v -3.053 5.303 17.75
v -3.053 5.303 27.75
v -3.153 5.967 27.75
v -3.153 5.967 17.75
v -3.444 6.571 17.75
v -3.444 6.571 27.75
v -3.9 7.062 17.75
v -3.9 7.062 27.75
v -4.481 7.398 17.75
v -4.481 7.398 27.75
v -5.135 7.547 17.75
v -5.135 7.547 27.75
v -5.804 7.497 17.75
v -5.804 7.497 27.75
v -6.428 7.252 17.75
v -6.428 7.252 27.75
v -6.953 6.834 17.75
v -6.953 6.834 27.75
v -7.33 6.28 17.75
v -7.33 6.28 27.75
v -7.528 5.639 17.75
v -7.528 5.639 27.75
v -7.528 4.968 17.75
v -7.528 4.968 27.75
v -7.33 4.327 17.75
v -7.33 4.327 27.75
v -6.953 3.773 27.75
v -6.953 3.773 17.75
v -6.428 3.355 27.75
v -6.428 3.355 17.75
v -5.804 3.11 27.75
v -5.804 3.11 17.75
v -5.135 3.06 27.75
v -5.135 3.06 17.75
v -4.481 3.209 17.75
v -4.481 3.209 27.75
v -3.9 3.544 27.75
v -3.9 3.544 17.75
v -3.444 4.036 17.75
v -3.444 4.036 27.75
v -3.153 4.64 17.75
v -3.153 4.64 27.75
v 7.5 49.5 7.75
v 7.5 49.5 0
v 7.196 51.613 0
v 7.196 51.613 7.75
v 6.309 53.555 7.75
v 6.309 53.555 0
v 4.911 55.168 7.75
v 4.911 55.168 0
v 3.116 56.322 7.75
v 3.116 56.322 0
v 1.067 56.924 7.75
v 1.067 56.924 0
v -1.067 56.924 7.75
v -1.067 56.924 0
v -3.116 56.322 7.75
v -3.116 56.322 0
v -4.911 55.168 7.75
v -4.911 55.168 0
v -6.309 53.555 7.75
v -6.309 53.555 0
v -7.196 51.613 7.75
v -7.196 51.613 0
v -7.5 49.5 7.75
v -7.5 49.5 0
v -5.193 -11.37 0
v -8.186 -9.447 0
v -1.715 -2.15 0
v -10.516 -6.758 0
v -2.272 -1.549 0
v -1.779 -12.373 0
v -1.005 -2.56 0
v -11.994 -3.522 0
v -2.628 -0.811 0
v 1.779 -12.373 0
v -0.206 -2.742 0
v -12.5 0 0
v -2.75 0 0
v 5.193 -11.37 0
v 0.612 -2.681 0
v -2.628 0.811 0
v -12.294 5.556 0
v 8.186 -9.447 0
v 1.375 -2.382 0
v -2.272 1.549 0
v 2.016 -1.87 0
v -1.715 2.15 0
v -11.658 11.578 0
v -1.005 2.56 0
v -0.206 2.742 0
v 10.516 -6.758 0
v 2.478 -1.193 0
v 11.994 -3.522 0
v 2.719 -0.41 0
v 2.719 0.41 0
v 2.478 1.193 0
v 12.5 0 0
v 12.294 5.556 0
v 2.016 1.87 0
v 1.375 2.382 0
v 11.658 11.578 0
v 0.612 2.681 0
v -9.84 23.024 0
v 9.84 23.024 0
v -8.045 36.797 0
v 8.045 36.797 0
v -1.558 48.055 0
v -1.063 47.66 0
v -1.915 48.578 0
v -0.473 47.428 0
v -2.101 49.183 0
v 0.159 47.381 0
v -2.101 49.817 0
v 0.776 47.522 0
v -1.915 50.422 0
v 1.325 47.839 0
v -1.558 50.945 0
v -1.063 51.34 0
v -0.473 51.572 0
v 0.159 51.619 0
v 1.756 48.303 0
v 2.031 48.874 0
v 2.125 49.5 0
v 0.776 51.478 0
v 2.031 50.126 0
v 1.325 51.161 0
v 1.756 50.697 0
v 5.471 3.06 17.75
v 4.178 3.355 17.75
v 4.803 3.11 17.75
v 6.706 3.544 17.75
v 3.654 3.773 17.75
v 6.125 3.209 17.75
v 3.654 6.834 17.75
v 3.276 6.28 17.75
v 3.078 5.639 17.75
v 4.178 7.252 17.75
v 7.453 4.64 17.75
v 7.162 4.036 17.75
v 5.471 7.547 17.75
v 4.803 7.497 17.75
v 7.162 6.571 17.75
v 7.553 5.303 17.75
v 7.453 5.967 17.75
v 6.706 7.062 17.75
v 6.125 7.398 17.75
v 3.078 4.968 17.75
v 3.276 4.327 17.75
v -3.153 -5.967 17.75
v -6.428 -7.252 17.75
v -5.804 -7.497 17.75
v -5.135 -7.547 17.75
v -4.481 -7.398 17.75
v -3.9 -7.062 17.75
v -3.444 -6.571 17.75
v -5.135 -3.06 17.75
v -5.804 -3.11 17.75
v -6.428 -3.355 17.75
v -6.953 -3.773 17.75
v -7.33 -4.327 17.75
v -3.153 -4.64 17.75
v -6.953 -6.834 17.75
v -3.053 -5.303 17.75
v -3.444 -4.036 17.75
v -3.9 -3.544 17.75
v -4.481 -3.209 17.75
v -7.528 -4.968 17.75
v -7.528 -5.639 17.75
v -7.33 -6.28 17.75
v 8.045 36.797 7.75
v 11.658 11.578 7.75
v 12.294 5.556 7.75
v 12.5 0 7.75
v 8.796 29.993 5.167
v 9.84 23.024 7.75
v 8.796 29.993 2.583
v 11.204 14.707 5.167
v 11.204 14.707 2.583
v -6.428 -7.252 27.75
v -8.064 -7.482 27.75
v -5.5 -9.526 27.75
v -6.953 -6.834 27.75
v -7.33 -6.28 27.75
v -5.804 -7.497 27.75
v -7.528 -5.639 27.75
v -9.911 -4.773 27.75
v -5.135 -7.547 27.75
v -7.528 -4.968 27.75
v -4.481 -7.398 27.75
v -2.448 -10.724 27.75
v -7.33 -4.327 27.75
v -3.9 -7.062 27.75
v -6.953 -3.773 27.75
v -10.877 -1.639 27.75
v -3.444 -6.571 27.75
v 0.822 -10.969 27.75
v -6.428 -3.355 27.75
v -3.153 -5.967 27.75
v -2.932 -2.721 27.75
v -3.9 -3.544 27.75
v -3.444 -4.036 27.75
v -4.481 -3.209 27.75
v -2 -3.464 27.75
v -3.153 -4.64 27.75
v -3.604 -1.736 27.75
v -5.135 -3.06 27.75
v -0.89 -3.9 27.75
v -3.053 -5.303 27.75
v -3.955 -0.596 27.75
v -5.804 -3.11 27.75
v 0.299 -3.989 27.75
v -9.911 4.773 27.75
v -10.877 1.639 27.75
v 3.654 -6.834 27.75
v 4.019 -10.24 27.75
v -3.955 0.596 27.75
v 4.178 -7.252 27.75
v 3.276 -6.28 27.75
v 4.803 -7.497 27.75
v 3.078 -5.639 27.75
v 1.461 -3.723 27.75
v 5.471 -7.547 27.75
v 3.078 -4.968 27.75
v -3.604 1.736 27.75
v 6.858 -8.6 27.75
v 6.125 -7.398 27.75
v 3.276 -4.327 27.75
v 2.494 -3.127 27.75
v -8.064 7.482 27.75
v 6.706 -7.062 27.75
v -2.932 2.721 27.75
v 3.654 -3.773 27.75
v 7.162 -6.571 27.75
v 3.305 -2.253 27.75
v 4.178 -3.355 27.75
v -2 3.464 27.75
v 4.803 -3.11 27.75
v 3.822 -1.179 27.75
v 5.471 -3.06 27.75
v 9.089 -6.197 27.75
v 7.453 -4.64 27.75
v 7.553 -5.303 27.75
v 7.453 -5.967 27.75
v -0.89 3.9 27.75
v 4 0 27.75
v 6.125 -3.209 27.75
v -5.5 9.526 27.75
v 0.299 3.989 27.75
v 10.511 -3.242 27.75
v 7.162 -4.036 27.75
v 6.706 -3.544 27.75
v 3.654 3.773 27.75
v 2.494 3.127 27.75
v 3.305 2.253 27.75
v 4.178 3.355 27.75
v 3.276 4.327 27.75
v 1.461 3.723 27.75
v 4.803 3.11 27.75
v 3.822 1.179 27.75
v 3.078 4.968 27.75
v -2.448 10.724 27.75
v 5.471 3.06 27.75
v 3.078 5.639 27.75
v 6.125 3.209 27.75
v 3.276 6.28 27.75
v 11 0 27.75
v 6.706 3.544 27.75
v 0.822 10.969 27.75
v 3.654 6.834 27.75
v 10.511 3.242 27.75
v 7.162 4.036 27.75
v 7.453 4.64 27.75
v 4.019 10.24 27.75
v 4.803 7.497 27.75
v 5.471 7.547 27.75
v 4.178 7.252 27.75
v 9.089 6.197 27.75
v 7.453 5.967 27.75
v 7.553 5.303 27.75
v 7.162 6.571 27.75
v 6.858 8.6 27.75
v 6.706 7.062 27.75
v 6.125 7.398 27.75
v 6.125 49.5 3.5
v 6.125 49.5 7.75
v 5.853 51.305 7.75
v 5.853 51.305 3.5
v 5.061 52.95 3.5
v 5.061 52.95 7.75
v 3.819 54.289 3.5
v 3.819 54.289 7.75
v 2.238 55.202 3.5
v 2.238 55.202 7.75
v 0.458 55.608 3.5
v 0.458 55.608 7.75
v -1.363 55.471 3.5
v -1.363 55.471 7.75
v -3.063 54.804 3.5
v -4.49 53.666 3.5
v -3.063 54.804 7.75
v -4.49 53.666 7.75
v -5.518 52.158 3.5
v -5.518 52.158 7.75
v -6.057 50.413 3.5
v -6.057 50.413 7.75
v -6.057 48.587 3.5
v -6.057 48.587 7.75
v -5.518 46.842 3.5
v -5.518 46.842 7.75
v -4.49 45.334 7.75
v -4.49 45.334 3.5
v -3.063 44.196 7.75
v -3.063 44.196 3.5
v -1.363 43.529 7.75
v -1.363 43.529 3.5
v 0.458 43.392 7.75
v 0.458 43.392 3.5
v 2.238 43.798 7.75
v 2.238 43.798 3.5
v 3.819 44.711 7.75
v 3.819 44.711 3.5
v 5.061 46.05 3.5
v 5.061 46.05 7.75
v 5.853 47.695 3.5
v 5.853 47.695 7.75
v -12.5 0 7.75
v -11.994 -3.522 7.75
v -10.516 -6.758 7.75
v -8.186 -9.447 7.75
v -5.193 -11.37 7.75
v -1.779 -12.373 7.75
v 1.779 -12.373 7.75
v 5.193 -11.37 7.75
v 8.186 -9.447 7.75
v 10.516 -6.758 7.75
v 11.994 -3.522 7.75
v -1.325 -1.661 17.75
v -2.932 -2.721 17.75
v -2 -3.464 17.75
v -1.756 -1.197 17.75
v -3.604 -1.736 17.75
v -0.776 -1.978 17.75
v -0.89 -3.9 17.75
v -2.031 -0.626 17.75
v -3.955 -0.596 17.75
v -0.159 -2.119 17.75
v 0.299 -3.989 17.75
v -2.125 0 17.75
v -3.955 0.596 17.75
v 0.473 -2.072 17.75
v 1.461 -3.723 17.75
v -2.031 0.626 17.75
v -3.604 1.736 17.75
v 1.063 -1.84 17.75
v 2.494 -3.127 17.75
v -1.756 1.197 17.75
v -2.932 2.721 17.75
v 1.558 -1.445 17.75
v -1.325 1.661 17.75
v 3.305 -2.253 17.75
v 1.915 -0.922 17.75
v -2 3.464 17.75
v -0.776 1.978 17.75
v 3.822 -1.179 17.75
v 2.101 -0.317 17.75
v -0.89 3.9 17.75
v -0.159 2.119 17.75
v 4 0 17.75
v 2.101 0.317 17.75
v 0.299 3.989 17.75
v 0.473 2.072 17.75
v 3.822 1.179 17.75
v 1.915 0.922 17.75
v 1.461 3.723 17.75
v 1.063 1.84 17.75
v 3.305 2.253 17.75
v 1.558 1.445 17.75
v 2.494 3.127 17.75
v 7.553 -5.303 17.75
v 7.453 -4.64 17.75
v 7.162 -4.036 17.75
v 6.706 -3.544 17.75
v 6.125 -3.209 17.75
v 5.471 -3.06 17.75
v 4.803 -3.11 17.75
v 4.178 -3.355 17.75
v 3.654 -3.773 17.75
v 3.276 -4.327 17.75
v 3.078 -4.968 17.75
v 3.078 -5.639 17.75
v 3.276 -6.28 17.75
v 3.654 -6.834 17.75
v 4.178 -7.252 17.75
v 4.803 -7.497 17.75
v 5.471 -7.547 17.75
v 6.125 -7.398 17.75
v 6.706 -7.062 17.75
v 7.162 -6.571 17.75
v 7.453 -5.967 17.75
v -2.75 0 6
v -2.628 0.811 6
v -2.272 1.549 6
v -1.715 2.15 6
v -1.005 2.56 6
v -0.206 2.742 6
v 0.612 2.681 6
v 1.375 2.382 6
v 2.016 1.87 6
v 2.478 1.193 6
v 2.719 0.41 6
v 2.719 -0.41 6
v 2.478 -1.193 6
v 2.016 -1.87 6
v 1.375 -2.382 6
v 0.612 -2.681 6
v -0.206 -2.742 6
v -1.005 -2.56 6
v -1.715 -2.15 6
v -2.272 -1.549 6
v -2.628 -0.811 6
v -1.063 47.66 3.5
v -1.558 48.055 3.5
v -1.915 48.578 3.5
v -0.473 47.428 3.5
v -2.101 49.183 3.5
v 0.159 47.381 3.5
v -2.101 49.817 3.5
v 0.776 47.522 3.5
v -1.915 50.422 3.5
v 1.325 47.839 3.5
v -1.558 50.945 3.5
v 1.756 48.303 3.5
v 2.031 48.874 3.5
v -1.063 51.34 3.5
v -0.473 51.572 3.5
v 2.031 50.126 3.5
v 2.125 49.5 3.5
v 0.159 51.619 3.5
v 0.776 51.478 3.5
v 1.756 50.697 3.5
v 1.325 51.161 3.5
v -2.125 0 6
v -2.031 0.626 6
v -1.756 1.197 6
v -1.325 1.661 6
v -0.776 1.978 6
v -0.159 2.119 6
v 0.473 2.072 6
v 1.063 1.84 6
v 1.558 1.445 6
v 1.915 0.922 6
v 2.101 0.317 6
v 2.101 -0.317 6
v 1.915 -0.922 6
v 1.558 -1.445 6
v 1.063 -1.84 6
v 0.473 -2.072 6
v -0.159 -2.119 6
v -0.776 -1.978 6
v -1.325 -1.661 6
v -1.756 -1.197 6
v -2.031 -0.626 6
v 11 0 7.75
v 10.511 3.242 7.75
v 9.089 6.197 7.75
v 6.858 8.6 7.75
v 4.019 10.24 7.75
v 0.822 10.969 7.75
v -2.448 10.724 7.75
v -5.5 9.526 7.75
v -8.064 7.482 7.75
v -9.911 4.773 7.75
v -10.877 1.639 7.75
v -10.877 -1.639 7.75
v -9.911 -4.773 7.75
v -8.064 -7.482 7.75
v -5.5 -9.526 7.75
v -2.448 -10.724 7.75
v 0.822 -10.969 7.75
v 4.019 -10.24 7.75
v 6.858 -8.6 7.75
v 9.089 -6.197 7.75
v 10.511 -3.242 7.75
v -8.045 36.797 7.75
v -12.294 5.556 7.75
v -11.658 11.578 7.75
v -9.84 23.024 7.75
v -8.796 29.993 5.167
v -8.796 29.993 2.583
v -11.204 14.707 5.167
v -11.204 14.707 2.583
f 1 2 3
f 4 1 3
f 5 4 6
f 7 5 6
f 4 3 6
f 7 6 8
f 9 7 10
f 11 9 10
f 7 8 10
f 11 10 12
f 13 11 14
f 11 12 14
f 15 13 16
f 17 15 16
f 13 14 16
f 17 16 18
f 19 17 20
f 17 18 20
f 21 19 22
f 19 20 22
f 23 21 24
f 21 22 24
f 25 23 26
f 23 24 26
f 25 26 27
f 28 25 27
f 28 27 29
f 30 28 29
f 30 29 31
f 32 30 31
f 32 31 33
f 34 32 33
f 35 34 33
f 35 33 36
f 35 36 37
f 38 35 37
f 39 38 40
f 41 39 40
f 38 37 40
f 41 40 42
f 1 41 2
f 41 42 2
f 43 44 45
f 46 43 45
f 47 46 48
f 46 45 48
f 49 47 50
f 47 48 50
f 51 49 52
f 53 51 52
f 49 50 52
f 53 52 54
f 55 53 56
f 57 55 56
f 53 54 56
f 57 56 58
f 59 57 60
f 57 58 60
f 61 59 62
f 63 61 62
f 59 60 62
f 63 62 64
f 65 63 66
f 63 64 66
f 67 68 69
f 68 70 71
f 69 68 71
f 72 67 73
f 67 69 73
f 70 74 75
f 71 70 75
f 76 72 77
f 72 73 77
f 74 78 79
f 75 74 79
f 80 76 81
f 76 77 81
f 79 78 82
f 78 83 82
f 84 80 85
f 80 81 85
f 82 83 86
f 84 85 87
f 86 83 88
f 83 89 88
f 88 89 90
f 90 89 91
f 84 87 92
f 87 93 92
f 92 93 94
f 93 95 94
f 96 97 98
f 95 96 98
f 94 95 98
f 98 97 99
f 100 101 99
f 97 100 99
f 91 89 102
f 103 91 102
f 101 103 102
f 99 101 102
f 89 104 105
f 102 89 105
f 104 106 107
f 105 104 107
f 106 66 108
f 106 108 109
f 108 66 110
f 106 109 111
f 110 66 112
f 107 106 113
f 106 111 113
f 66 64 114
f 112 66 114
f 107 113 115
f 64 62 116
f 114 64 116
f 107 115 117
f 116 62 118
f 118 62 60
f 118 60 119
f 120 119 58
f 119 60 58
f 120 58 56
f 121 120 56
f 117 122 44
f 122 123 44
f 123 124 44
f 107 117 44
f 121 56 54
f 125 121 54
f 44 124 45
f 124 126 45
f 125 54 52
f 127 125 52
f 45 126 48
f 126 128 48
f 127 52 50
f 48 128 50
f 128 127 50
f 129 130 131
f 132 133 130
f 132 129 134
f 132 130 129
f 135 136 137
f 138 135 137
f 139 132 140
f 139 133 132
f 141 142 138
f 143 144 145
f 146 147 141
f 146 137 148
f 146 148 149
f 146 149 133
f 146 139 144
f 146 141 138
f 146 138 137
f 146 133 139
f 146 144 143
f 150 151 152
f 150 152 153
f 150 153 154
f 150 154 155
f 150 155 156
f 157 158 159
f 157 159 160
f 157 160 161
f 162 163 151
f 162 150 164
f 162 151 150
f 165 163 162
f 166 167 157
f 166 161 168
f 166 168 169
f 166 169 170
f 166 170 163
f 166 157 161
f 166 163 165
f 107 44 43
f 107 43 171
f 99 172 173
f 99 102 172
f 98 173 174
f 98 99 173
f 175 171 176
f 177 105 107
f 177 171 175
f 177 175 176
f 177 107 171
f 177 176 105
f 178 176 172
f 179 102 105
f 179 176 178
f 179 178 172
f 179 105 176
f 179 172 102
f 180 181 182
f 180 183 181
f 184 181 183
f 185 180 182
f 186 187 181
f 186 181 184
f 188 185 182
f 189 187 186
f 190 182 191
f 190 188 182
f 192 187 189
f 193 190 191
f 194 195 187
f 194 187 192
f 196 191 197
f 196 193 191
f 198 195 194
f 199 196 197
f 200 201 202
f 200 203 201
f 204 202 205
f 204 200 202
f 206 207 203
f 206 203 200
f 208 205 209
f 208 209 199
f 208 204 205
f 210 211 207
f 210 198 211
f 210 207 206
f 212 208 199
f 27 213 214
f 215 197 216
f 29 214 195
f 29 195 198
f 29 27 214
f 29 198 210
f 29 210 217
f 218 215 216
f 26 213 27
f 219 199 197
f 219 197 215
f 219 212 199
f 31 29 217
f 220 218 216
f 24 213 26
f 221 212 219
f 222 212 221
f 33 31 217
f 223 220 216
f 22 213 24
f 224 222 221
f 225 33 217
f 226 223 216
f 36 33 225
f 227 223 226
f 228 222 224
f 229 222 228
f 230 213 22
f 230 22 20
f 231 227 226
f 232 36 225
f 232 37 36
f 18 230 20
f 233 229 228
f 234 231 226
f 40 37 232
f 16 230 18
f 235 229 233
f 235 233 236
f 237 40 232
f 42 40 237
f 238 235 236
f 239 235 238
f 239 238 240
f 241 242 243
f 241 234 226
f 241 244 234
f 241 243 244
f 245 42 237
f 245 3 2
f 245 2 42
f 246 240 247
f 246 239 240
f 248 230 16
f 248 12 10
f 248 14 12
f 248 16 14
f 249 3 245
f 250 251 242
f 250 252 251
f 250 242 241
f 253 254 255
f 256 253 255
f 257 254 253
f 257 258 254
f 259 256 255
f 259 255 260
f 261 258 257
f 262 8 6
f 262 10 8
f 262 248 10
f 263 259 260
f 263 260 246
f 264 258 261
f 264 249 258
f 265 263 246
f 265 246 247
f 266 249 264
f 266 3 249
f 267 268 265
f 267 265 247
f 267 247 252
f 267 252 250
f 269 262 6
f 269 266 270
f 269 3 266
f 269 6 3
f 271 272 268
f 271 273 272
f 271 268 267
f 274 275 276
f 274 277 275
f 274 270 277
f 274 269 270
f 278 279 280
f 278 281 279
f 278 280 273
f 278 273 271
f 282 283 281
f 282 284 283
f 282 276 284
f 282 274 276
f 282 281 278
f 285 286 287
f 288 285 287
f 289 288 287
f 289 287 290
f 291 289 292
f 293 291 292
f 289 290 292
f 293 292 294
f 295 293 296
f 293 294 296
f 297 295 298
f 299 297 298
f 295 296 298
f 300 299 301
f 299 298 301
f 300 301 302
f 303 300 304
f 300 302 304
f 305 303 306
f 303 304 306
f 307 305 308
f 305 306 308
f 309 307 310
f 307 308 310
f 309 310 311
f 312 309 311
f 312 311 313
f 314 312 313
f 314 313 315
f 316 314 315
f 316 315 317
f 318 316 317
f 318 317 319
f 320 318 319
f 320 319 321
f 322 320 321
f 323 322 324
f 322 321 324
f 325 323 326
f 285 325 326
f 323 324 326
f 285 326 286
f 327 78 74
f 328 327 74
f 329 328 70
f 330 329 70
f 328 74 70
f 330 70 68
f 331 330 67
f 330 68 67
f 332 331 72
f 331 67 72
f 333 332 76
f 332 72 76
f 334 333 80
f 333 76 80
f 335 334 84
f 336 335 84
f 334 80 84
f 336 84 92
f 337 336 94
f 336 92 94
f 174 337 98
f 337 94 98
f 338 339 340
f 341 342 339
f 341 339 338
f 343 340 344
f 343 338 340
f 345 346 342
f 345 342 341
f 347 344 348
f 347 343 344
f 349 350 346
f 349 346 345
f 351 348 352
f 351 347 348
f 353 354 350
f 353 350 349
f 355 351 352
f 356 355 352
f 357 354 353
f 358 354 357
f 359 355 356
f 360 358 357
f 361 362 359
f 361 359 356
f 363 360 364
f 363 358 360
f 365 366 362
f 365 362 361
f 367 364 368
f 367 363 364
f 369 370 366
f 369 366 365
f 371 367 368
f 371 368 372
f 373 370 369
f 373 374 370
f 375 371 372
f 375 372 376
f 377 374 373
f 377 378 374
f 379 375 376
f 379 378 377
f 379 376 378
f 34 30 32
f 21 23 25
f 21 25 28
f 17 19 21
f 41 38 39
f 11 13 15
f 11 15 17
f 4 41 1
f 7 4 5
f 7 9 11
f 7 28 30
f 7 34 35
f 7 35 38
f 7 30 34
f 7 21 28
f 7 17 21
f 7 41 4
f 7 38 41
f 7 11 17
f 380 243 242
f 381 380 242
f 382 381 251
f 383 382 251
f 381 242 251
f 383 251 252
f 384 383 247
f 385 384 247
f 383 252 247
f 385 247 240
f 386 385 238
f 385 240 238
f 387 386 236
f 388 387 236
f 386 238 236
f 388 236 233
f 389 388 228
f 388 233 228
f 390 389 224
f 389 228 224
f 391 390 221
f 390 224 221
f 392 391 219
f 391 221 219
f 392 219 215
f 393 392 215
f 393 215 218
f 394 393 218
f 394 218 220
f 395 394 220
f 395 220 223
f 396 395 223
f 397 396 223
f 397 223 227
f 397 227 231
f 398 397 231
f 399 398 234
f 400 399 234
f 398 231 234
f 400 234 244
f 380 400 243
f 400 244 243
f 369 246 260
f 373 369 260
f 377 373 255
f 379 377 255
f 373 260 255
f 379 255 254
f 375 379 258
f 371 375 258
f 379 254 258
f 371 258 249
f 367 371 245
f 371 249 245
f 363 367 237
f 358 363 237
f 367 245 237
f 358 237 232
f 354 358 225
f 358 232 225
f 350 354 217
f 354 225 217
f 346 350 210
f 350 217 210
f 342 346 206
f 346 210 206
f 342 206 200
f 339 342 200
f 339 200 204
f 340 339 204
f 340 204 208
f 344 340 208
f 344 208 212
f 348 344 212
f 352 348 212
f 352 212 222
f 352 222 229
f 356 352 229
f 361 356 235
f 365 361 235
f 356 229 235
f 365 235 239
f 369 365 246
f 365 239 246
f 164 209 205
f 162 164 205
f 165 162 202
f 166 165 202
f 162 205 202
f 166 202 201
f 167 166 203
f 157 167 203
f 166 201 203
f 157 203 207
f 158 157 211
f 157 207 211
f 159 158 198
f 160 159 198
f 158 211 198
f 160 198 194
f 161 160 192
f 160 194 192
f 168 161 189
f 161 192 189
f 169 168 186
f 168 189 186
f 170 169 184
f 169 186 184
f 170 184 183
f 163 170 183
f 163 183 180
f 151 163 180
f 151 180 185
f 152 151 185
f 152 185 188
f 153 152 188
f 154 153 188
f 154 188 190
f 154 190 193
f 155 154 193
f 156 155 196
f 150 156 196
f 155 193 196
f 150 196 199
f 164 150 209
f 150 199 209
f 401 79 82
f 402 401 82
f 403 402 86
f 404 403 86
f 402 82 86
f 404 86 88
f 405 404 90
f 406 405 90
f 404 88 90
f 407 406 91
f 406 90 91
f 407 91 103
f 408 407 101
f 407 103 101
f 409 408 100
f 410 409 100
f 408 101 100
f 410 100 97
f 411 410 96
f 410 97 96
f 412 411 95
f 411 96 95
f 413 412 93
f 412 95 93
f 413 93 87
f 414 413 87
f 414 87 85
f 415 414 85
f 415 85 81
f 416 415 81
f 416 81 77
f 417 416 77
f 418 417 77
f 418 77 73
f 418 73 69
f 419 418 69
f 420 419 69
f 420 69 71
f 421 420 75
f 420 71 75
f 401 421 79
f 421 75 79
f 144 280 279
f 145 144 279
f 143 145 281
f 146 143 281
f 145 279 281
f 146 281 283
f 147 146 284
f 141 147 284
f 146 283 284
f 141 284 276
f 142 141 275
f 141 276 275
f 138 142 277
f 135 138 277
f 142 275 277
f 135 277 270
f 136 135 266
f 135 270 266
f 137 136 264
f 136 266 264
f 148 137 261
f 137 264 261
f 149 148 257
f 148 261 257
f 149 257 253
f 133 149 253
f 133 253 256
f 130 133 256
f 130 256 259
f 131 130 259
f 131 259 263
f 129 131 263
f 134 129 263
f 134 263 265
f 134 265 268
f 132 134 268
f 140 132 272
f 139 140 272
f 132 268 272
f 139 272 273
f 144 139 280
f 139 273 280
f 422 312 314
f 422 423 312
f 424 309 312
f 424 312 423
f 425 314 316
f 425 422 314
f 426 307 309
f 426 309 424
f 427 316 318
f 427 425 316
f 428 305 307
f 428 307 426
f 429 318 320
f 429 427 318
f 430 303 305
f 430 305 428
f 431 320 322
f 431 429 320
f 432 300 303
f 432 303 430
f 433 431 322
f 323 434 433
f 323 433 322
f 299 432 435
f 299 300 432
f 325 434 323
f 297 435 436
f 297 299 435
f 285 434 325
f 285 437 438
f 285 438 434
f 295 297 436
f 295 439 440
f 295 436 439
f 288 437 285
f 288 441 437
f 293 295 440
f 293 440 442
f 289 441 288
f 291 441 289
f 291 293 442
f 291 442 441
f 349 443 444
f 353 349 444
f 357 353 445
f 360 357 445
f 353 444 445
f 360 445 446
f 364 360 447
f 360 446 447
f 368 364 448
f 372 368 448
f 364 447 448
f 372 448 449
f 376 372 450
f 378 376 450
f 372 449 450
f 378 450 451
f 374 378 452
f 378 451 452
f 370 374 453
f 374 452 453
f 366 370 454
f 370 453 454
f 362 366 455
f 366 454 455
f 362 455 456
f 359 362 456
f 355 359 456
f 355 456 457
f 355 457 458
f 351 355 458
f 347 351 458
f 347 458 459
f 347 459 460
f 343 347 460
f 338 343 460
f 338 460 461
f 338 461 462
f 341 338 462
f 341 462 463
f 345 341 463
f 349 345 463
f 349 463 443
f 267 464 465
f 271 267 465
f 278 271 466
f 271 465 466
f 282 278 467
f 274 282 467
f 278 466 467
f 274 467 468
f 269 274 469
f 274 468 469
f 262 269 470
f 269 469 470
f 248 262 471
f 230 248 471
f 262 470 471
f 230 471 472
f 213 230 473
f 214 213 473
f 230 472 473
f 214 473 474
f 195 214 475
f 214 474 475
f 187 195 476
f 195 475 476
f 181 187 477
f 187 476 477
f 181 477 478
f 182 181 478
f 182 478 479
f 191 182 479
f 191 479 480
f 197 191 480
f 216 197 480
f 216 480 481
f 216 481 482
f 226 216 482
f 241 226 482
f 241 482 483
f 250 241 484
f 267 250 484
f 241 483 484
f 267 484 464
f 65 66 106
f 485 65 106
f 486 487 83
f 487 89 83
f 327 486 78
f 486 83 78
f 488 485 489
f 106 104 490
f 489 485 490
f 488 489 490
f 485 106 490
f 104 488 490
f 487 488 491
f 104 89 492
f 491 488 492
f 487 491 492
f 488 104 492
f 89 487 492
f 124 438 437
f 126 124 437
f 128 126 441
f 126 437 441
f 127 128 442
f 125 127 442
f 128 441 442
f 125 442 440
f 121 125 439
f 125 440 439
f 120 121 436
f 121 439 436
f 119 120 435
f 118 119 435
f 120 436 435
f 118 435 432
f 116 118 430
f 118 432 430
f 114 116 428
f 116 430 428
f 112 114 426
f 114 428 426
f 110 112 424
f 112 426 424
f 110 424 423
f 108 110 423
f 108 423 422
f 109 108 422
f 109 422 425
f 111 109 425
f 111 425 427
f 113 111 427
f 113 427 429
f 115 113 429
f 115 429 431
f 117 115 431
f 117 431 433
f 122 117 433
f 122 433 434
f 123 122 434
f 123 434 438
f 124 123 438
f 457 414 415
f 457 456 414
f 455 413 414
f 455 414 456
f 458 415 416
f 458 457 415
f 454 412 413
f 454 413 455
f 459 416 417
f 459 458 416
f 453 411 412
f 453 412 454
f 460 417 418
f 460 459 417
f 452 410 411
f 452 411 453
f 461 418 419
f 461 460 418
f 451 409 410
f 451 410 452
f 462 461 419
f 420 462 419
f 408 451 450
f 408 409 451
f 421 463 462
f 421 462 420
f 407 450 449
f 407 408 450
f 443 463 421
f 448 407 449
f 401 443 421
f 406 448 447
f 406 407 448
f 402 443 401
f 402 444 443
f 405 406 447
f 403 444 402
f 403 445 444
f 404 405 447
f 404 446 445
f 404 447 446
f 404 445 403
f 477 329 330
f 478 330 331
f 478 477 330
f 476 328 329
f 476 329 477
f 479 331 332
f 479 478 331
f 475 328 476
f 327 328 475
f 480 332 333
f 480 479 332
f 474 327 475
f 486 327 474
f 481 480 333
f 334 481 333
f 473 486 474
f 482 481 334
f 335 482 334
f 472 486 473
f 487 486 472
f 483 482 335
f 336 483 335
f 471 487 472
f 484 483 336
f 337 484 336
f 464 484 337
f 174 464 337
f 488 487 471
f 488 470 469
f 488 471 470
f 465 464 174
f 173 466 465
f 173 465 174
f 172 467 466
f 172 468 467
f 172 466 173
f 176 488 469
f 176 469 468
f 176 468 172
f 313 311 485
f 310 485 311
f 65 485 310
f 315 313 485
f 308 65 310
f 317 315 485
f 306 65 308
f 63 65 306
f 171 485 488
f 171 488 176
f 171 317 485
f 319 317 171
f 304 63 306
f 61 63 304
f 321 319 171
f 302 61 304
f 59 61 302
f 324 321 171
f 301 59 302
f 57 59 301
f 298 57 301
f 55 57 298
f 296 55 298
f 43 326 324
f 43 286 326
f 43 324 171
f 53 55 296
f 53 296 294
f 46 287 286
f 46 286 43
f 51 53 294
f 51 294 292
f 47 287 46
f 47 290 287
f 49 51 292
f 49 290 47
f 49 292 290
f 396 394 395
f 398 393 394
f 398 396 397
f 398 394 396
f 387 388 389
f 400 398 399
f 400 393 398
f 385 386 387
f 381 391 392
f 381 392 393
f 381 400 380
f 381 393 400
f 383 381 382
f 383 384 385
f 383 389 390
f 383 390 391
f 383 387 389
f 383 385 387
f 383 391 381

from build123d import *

# Parameters (mm, degrees)
BOSS_EXTRUDE1_DEPTH = 7.75
SKETCH2_R           = 6.125
CUT_EXTRUDE1_DEPTH  = 4.25
CUT_EXTRUDE2_REACH  = 5.5
SKETCH3_R           = 2.125
SKETCH4_R           = 11
BOSS_EXTRUDE2_DEPTH = 20
SKETCH5_R           = 2.25
SKETCH5_R_2         = 4
CUT_EXTRUDE3_DEPTH  = 10
SKETCH6_R           = 2.125
CUT_EXTRUDE4_DEPTH  = 28.75
SKETCH10_R          = 2.75
CUT_EXTRUDE5_DEPTH  = 6


with BuildPart() as part:
    # Sketch1 → Boss-Extrude1 (new body)
    with BuildSketch(Plane.XY):
        with BuildLine():
            ThreePointArc((-12.5, 0), (0, -12.5), (12.5, 0))
            add(Edge.make_bspline(
                [(7.5, 49.5), (7.5, 26.668276539), (12.5, 15.631461909), (12.5, 0)],
                knots=[0, 0, 0, 0, 1, 1, 1, 1], degree=3))
            ThreePointArc((7.5, 49.5), (0, 57), (-7.5, 49.5))
            add(Edge.make_bspline(
                [(-7.5, 49.5), (-7.5, 26.668276539), (-12.5, 15.631461909), (-12.5, 0)],
                knots=[0, 0, 0, 0, 1, 1, 1, 1], degree=3))
        make_face()
    extrude(amount=BOSS_EXTRUDE1_DEPTH)

    # Sketch2 → Cut-Extrude1 (cut)
    with BuildSketch(Plane.XY.offset(7.75)):
        with Locations((0, 49.5)):
            Circle(SKETCH2_R)
    extrude(amount=-CUT_EXTRUDE1_DEPTH, mode=Mode.SUBTRACT)

    # Sketch3 → Cut-Extrude2 (cut, up to next)
    with BuildSketch(Plane.XY.offset(3.5), mode=Mode.PRIVATE) as cut_extrude2_sk1:
        with Locations((0, 49.5)):
            Circle(SKETCH3_R)
    cut_extrude2_tool1 = extrude(cut_extrude2_sk1.sketch, amount=-CUT_EXTRUDE2_REACH, mode=Mode.PRIVATE) & part.part
    add(cut_extrude2_tool1.solids().sort_by_distance((0, 49.5, 3.5))[0], mode=Mode.SUBTRACT)

    # Sketch4 → Boss-Extrude2 (add)
    with BuildSketch(Plane.XY.offset(7.75)):
        Circle(SKETCH4_R)
    extrude(amount=BOSS_EXTRUDE2_DEPTH)

    # Sketch5 → Cut-Extrude3 (cut)
    with BuildSketch(Plane.XY.offset(27.75)):
        with Locations((5.303300859, 5.303300859)):
            Circle(SKETCH5_R)
        with Locations((5.303300859, -5.303300859)):
            Circle(SKETCH5_R)
        with Locations((-5.303300859, -5.303300859)):
            Circle(SKETCH5_R)
        with Locations((-5.303300859, 5.303300859)):
            Circle(SKETCH5_R)
        Circle(SKETCH5_R_2)
    extrude(amount=-CUT_EXTRUDE3_DEPTH, mode=Mode.SUBTRACT)

    # Sketch6 → Cut-Extrude4 (cut, through all)
    with BuildSketch(Plane(origin=(0, 0, 0), x_dir=(-1, 0, 0), z_dir=(0, 0, -1))):
        Circle(SKETCH6_R)
    extrude(amount=-CUT_EXTRUDE4_DEPTH, mode=Mode.SUBTRACT)

    # Sketch10 → Cut-Extrude5 (cut)
    with BuildSketch(Plane(origin=(0, 0, 0), x_dir=(-1, 0, 0), z_dir=(0, 0, -1))):
        Circle(SKETCH10_R)
    extrude(amount=-CUT_EXTRUDE5_DEPTH, mode=Mode.SUBTRACT)


solid = part.part
